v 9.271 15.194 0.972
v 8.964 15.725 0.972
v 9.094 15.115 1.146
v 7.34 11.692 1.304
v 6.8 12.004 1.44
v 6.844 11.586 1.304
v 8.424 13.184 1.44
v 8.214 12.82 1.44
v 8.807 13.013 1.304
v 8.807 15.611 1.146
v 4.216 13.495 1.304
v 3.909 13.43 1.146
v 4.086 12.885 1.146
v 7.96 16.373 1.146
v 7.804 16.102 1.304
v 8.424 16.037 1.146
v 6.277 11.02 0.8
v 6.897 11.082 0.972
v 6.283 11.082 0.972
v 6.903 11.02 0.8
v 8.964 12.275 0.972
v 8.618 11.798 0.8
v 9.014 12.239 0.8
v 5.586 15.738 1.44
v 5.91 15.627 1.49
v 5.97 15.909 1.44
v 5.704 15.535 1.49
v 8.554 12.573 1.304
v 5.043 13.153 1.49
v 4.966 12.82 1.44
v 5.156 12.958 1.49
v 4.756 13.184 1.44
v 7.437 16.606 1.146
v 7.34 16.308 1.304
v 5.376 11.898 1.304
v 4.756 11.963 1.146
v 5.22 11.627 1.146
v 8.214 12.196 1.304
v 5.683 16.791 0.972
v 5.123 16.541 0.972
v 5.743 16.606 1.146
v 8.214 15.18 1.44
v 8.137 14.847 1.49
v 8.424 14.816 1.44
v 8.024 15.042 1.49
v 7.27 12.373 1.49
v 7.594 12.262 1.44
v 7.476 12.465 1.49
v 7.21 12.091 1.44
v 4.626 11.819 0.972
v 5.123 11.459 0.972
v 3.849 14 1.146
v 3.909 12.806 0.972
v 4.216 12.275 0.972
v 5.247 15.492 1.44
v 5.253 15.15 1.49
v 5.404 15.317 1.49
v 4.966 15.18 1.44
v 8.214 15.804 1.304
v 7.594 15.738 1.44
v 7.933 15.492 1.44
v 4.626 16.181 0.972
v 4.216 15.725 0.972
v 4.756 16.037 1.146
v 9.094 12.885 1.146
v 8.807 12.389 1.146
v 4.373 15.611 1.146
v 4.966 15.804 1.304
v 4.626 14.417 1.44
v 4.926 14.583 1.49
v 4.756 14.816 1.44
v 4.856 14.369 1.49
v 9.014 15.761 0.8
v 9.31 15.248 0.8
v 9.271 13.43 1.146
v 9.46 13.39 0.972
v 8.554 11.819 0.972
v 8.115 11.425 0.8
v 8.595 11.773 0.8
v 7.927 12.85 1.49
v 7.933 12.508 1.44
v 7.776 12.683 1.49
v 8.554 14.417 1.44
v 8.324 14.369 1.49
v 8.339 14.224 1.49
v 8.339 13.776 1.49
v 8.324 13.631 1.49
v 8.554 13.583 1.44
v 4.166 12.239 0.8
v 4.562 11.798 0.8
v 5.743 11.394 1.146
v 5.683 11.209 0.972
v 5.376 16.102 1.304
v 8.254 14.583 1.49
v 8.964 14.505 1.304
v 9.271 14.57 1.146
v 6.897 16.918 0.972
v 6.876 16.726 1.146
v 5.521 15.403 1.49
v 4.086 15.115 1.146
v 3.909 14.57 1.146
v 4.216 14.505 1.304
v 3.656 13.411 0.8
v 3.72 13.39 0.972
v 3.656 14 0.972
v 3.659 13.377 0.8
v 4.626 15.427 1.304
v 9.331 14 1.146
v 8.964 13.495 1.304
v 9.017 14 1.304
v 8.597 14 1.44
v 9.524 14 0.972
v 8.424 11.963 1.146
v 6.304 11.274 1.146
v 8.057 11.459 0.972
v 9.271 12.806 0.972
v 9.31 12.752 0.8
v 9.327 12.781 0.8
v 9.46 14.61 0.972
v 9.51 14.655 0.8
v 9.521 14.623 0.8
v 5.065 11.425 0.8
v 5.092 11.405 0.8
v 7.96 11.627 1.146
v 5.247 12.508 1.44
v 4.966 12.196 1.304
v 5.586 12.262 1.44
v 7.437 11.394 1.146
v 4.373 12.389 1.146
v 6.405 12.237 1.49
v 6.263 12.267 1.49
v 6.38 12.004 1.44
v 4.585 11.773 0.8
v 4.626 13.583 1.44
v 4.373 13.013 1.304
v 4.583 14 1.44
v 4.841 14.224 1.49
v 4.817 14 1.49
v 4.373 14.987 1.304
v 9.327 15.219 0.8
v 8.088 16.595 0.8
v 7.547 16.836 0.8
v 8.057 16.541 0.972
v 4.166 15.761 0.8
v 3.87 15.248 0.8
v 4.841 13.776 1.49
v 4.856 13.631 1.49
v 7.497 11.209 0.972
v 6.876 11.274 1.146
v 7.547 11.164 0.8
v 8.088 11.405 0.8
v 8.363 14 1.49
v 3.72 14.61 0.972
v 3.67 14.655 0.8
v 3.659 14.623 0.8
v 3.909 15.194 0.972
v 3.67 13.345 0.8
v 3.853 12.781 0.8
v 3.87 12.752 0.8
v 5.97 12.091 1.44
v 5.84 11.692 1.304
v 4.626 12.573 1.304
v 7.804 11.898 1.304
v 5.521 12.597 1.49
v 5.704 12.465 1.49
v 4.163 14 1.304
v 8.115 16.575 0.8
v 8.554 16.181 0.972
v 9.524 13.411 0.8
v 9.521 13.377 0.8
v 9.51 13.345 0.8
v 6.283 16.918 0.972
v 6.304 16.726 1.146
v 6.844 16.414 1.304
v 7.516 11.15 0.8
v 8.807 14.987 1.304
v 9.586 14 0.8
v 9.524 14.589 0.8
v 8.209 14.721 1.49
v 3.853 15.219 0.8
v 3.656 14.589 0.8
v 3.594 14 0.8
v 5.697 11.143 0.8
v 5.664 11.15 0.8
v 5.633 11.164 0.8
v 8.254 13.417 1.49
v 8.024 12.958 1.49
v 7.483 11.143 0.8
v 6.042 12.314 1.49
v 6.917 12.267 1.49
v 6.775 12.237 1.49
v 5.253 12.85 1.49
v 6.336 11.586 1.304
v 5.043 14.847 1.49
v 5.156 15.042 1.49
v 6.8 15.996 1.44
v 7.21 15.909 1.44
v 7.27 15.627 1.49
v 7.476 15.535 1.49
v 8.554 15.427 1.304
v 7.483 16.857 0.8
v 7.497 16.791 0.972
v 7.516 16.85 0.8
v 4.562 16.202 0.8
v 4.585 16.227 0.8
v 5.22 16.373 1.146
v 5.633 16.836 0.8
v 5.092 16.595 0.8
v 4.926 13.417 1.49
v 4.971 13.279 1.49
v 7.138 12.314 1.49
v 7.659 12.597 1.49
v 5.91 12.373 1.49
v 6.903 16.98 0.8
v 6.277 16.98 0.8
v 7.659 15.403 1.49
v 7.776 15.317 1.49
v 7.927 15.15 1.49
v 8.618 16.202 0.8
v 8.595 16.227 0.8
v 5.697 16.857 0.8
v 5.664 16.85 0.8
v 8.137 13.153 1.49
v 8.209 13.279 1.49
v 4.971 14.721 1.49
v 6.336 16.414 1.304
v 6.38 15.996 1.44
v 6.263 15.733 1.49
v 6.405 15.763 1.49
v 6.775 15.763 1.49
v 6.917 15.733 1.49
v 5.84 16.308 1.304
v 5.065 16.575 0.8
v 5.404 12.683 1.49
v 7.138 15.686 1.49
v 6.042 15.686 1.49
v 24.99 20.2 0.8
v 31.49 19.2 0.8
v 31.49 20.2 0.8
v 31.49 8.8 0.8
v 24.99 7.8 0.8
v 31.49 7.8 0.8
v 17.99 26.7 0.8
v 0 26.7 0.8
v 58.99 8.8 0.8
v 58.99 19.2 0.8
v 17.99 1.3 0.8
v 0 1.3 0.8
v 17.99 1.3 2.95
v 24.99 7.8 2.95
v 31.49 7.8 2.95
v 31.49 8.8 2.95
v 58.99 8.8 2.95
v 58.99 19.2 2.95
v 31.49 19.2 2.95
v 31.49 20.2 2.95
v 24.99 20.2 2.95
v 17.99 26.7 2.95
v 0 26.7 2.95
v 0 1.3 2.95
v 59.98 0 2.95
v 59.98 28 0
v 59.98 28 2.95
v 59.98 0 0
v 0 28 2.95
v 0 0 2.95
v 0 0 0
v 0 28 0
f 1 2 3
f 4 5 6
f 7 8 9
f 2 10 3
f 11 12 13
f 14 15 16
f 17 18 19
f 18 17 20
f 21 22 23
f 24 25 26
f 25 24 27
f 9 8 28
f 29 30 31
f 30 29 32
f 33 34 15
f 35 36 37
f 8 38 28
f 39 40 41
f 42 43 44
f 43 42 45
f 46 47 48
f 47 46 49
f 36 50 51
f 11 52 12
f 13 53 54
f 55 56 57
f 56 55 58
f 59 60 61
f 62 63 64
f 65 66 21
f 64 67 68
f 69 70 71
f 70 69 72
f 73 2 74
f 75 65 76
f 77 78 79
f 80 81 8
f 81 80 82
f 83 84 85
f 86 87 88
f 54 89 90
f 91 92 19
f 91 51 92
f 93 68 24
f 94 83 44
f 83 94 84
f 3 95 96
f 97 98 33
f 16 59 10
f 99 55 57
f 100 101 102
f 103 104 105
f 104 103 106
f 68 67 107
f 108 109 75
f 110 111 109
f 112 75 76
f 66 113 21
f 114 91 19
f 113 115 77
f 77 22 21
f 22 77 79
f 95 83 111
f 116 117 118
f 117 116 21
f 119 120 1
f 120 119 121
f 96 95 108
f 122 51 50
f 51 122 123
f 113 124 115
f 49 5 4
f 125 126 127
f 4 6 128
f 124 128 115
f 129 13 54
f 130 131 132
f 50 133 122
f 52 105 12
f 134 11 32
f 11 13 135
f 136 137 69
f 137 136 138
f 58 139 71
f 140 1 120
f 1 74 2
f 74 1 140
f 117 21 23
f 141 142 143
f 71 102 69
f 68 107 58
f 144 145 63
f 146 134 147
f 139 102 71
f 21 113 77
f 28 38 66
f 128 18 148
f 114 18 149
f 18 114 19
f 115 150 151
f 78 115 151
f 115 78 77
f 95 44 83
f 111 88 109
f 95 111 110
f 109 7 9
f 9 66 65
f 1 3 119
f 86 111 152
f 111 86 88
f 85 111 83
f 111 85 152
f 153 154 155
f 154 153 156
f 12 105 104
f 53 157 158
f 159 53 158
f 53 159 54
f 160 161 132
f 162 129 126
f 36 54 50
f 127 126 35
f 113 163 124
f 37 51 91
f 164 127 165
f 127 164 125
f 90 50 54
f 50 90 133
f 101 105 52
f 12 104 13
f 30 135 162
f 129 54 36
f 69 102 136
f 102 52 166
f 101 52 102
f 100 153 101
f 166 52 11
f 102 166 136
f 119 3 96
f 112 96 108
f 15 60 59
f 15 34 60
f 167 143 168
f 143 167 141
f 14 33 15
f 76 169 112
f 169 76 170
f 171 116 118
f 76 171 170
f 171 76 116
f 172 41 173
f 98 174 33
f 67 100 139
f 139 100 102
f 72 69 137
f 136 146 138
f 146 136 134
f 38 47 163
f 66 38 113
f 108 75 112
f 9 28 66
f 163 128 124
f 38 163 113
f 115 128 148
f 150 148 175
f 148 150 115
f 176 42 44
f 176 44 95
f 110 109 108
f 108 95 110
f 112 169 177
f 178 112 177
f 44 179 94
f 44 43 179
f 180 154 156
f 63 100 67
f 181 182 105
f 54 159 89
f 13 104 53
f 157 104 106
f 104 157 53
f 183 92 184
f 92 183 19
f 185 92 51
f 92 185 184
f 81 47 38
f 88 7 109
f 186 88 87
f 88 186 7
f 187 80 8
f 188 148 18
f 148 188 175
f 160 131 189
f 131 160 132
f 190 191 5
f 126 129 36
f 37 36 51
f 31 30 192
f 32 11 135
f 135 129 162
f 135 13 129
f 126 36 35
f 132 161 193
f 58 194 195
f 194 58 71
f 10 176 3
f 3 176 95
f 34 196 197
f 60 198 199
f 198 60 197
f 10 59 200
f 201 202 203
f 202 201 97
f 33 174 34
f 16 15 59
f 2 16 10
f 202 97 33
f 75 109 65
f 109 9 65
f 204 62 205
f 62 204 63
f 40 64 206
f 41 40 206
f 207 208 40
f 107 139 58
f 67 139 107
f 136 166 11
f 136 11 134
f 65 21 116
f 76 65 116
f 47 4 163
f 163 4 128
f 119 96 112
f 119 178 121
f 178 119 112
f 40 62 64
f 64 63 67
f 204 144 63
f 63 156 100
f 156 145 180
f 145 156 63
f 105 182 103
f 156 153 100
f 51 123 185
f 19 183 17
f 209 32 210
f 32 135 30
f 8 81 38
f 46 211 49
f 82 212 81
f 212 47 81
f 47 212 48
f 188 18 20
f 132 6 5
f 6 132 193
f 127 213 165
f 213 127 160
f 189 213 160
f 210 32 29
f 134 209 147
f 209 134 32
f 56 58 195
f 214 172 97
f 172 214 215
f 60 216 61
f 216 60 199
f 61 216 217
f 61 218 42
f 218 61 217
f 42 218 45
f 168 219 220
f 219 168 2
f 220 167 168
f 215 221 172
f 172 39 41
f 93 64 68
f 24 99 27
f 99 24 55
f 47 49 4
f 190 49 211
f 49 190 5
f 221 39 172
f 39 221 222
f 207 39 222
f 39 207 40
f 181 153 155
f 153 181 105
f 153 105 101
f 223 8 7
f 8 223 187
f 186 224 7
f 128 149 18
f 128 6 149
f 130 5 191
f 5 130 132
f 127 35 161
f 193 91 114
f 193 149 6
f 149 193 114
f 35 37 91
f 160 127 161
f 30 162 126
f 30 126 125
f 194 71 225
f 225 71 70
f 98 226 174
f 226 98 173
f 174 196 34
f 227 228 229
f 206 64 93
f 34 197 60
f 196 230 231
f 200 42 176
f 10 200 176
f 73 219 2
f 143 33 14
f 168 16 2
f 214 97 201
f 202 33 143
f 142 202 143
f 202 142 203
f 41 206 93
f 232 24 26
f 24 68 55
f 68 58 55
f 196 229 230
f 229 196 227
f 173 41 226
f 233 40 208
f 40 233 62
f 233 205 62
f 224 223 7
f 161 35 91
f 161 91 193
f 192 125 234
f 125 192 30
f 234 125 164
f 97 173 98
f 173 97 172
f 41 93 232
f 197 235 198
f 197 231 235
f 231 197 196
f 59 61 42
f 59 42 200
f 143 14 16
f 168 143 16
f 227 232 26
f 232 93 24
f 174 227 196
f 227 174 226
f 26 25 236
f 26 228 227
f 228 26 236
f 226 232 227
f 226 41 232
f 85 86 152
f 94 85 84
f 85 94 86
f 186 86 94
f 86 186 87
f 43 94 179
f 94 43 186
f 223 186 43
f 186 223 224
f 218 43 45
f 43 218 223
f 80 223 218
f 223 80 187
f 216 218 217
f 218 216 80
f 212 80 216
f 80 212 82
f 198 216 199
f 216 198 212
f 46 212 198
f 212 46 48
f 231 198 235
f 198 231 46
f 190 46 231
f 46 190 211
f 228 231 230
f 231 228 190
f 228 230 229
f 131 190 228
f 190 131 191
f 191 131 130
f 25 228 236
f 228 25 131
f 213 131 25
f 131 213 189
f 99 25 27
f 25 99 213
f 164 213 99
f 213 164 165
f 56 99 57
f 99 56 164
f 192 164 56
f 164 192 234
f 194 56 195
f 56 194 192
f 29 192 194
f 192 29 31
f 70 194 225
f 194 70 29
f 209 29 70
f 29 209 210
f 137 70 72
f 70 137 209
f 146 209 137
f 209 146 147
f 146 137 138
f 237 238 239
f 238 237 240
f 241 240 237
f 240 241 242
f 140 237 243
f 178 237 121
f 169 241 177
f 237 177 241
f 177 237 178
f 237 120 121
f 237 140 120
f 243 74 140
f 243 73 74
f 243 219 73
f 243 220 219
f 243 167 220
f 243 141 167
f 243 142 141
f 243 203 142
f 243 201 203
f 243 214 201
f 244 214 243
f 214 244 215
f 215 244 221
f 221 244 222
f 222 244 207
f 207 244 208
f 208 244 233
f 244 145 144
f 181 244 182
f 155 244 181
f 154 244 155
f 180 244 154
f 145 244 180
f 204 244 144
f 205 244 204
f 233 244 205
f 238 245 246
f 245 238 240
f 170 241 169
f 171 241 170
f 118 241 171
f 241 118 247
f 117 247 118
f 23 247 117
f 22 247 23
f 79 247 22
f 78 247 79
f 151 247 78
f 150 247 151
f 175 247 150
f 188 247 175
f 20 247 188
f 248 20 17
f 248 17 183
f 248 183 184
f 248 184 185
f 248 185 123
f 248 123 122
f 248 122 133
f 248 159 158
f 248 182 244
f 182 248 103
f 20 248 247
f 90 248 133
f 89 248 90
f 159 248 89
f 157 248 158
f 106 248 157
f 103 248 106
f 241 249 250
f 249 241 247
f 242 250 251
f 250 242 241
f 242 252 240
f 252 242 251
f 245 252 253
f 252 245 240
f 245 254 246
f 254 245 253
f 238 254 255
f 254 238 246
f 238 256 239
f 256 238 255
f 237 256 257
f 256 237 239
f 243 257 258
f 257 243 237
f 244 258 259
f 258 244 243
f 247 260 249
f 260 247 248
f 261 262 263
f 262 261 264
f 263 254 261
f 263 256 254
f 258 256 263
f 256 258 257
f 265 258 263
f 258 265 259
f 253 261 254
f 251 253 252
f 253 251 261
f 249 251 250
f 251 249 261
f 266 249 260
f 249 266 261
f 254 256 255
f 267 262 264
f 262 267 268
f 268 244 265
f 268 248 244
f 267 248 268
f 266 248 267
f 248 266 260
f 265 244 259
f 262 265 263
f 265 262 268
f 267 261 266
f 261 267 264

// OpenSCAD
// file: keys/stopper.scad
module key_stopper(width, height) {
  d = 0.7;
  difference() {
    translate([0,0,0]) scale([height/20,width/20,d/8]) sphere(r=10);
    translate([-height/2,-width/2,d]) cube([height,width,2]);
    translate([-height/2,-width/2,-2]) cube([height,width,2]);
  }
}



module key_window() {
    d = 3;
    l = 14; h = 9; r_h = 4;
    union() {
        translate([0,-l/2,0]) cube([h-r_h/2, l, d]);
        translate([h-r_h/2,0,0]) scale([r_h/10, l/10, 1]) cylinder(d=10, h=d, $fn=50);
    }
}

module key_window_positioned() {
    translate([0.5,0,1.8]) key_window();
}
// file: keys/bv.scad
include <stopper.scad>

module key_bv(inset, gap) {
  w_top = 23+gap;     h_maxw = 17+inset;
  w_stopper = 13+gap;   h_stopper = 23.5+inset;
  w_beard = 8+gap;    h_beard_s = 28+inset;
  h_total = 55+inset;  d=2.5;
  stopper_from_top = 6.4;
  difference() {
    linear_extrude(d) rotate([0,0,270]) polygon([
      [0,0], [w_top/2,0], [w_top/2,h_maxw],
      [w_stopper/2, h_stopper], [w_stopper/2, h_beard_s],
      [w_beard/2, h_beard_s], [w_beard/2, h_total], [0, h_total],
      [-w_beard/2, h_total], [-w_beard/2, h_beard_s],
      [-w_stopper/2, h_beard_s], [-w_stopper/2, h_stopper],
      [-w_top/2,h_maxw], [-w_top/2,0],
    ]);
    translate([stopper_from_top,0,-0.01]) key_stopper(6,6);
  }
}
// file: keys/tr.scad
include <stopper.scad>

module key_tr(inset, gap) {
  w_top = 25+gap;     h_maxw = 17.5+inset;
  w_stopper = 12+gap;   h_stopper = 24.5+inset;
  w_beard = 10+gap;    h_beard_s = 31+inset;
  h_total = 58.5+inset;  d=2.2;
  stopper_from_top = 6.6;
  difference() {
    linear_extrude(d) rotate([0,0,270]) polygon([
      [0,0], [w_top/2,0], [w_top/2,h_maxw],
      [w_stopper/2, h_stopper], [w_stopper/2, h_beard_s],
      [w_beard/2, h_beard_s], [w_beard/2, h_total], [0, h_total],
      [-w_beard/2, h_total], [-w_beard/2, h_beard_s],
      [-w_stopper/2, h_beard_s], [-w_stopper/2, h_stopper],
      [-w_top/2,h_maxw], [-w_top/2,0],
    ]);
    translate([stopper_from_top,0,-0.01]) key_stopper(6,6);
  }
}
// file: keys/ju.scad
module key_ju(inset, gap) {
  w_top = 22.9+gap;     h_maxw = 16.5+inset;
  w_stopper = 11+gap;   h_stopper = 22.5+inset;
  w_beard = 7.8+gap;    h_beard_s = 28.5+inset;
  h_total = 57+inset;
  rotate([0,0,270]) polygon([
    [0,0], [w_top/2,0], [w_top/2,h_maxw],
    [w_stopper/2, h_stopper], [w_stopper/2, h_beard_s],
    [w_beard/2, h_beard_s], [w_beard/2, h_total], [0, h_total],
    [-w_beard/2, h_total], [-w_beard/2, h_beard_s],
    [-w_stopper/2, h_beard_s], [-w_stopper/2, h_stopper],
    [-w_top/2,h_maxw], [-w_top/2,0],
  ]);
}
// main file
include <keys/ju.scad>
include <keys/tr.scad>
include <keys/bv.scad>

delta = 0.01;
gap = 0.4;
inset = 0.5;

w = 60;
h = 28;
t_top = 0.8;
d = 2.5 + t_top+1;

d = 2.95; // cut off the top

difference() {
    cube([w-2*delta, h, d]);
    translate([w-delta,0,t_top]) {
        translate([-w,14,0]) {
            key_tr(inset, gap);
            key_window_positioned();
        }
    }
}
// difference() {
//     cube([w-2*delta, h, d]);
//     translate([w-delta,0,t_top]) {
//         translate([-w,14,0]) {
//             key_tr(inset, gap);
//             key_window_positioned();
//         }
//         translate([0,32,0]) rotate([0,0,180]) {
//             key_bv(inset, gap);
//             key_window_positioned();
//         }
//         translate([-w,49,0]) {
//             key_ju(inset, gap);
//             key_window_positioned();
//         }
//     }
// }
